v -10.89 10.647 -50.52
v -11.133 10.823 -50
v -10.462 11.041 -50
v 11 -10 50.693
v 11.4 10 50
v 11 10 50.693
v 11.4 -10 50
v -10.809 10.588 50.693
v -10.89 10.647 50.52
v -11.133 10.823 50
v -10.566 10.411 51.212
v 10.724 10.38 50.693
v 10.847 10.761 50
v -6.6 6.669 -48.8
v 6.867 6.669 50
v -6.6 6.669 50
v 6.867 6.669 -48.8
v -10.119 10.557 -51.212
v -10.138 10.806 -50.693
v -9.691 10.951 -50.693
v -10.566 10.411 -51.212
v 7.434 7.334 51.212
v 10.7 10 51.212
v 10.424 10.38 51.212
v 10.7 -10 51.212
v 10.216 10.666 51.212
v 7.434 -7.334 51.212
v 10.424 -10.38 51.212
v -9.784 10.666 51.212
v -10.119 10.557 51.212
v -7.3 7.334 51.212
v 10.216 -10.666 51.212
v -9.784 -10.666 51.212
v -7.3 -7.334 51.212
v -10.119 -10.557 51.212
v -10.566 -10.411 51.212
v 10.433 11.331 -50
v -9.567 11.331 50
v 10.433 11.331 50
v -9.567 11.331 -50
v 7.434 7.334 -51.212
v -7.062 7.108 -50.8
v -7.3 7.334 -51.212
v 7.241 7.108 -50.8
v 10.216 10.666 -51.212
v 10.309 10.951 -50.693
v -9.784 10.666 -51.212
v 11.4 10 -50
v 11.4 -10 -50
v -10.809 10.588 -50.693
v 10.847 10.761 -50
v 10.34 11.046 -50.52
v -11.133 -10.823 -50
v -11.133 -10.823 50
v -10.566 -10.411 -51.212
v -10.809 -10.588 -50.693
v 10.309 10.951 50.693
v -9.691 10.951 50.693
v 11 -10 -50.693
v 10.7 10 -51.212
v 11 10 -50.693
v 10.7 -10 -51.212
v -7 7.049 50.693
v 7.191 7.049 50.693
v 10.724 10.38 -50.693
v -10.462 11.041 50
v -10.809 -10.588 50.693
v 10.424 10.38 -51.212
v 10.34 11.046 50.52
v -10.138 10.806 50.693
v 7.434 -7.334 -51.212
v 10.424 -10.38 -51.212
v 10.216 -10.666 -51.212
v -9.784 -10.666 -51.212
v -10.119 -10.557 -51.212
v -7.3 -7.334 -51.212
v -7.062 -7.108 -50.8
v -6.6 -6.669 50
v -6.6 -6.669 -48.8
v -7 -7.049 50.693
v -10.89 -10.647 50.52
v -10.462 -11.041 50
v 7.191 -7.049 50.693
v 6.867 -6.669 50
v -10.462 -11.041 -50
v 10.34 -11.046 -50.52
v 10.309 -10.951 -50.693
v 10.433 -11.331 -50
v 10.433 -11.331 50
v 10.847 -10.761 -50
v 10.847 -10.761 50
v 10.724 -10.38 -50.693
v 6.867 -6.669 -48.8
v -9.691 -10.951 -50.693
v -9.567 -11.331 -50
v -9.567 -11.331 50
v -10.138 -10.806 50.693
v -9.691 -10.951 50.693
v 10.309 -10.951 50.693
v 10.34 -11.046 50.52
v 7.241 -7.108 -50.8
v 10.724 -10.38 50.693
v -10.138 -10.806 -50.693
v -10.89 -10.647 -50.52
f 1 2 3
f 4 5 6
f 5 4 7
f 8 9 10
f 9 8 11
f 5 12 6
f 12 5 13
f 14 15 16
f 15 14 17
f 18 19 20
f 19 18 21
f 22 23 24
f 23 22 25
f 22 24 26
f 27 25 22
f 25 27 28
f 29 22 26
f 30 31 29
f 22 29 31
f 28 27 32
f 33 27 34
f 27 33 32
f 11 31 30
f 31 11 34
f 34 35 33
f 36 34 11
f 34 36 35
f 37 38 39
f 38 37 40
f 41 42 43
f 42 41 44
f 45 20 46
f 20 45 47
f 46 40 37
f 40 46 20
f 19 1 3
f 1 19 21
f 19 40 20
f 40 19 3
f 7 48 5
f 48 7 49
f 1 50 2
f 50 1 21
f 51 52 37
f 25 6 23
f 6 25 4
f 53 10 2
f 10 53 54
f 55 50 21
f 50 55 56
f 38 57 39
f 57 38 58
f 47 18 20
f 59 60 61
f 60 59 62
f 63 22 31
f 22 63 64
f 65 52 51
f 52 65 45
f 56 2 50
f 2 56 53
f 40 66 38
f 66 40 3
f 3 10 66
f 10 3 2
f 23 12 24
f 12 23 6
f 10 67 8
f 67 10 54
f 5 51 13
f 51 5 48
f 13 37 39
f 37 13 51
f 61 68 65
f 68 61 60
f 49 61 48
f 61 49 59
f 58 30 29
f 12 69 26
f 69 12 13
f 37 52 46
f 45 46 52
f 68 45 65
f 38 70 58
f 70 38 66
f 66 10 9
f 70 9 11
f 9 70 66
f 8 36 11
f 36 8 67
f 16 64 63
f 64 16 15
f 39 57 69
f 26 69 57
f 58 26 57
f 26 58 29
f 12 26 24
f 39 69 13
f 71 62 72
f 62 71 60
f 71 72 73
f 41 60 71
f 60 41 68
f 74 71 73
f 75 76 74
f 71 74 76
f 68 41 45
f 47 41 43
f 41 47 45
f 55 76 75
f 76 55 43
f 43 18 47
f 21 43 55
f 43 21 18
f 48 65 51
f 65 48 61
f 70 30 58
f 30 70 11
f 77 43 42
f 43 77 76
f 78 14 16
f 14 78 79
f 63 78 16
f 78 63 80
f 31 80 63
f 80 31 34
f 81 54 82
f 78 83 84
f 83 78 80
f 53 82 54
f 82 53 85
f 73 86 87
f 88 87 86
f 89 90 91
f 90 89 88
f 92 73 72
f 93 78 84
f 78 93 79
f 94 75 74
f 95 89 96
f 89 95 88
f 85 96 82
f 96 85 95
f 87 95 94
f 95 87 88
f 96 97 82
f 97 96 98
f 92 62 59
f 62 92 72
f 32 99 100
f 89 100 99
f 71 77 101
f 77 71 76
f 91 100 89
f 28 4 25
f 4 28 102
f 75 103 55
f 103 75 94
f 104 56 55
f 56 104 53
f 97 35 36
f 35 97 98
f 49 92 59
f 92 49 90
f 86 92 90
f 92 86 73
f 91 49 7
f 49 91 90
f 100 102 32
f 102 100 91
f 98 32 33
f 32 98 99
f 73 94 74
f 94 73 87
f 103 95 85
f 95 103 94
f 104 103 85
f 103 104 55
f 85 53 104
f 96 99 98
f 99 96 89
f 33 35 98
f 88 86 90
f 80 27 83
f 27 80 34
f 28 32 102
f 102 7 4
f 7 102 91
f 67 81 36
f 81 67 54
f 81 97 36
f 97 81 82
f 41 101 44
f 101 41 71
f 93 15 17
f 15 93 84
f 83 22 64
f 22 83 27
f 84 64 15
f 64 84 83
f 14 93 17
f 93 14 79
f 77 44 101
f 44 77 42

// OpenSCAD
// Parameters
tube_length = 100; //[50:200:1]
outer_W = 20; //[10:40:1]
outer_H = 20; //[10:40:1]
wall_t = 2; //[1:6:0.5]
eps = 0.8; //[0.2:2:0.1]
chamfer = 0.8; //[0.2:2:0.1]
fillet_r = 0.6; //[0.2:2:0.1]
end_face_trim = 0.5; //[0.2:2:0.1]

// Base Shapes
module outer_tube_body() {
  cube([outer_W, outer_H, tube_length], center=true);
}

module inner_void_cutout() {
  cube([outer_W - 2*wall_t, outer_H - 2*wall_t, tube_length + 2*eps], center=true);
}

module end_face_trim_block() {
  cube([outer_W + 2*eps, outer_H + 2*eps, end_face_trim], center=true);
}

module fillet_sphere() {
  sphere(r=fillet_r, center=true);
}

module chamfer_sphere() {
  sphere(r=chamfer, center=true);
}

module material_labeling() {
  cube([outer_W - 2*wall_t, outer_H - 2*wall_t, wall_t], center=true);
}

// Operations
module tube_shell_diff() {
  difference() {
    outer_tube_body();
    inner_void_cutout();
  }
}

module end_faces() {
  difference() {
    tube_shell_diff();
    translate([0, 0, tube_length/2 - end_face_trim/2 + eps]) end_face_trim_block();
    translate([0, 0, -tube_length/2 + end_face_trim/2 - eps]) end_face_trim_block();
  }
}

module edge_chamfers() {
  minkowski() {
    end_faces();
    chamfer_sphere();
  }
}

module fillets() {
  minkowski() {
    edge_chamfers();
    fillet_sphere();
  }
}

module final_model_union() {
  union() {
    fillets();
    translate([0, 0, -tube_length/2 + wall_t/2 - eps]) material_labeling();
  }
}

// Final Output
final_model_union();
